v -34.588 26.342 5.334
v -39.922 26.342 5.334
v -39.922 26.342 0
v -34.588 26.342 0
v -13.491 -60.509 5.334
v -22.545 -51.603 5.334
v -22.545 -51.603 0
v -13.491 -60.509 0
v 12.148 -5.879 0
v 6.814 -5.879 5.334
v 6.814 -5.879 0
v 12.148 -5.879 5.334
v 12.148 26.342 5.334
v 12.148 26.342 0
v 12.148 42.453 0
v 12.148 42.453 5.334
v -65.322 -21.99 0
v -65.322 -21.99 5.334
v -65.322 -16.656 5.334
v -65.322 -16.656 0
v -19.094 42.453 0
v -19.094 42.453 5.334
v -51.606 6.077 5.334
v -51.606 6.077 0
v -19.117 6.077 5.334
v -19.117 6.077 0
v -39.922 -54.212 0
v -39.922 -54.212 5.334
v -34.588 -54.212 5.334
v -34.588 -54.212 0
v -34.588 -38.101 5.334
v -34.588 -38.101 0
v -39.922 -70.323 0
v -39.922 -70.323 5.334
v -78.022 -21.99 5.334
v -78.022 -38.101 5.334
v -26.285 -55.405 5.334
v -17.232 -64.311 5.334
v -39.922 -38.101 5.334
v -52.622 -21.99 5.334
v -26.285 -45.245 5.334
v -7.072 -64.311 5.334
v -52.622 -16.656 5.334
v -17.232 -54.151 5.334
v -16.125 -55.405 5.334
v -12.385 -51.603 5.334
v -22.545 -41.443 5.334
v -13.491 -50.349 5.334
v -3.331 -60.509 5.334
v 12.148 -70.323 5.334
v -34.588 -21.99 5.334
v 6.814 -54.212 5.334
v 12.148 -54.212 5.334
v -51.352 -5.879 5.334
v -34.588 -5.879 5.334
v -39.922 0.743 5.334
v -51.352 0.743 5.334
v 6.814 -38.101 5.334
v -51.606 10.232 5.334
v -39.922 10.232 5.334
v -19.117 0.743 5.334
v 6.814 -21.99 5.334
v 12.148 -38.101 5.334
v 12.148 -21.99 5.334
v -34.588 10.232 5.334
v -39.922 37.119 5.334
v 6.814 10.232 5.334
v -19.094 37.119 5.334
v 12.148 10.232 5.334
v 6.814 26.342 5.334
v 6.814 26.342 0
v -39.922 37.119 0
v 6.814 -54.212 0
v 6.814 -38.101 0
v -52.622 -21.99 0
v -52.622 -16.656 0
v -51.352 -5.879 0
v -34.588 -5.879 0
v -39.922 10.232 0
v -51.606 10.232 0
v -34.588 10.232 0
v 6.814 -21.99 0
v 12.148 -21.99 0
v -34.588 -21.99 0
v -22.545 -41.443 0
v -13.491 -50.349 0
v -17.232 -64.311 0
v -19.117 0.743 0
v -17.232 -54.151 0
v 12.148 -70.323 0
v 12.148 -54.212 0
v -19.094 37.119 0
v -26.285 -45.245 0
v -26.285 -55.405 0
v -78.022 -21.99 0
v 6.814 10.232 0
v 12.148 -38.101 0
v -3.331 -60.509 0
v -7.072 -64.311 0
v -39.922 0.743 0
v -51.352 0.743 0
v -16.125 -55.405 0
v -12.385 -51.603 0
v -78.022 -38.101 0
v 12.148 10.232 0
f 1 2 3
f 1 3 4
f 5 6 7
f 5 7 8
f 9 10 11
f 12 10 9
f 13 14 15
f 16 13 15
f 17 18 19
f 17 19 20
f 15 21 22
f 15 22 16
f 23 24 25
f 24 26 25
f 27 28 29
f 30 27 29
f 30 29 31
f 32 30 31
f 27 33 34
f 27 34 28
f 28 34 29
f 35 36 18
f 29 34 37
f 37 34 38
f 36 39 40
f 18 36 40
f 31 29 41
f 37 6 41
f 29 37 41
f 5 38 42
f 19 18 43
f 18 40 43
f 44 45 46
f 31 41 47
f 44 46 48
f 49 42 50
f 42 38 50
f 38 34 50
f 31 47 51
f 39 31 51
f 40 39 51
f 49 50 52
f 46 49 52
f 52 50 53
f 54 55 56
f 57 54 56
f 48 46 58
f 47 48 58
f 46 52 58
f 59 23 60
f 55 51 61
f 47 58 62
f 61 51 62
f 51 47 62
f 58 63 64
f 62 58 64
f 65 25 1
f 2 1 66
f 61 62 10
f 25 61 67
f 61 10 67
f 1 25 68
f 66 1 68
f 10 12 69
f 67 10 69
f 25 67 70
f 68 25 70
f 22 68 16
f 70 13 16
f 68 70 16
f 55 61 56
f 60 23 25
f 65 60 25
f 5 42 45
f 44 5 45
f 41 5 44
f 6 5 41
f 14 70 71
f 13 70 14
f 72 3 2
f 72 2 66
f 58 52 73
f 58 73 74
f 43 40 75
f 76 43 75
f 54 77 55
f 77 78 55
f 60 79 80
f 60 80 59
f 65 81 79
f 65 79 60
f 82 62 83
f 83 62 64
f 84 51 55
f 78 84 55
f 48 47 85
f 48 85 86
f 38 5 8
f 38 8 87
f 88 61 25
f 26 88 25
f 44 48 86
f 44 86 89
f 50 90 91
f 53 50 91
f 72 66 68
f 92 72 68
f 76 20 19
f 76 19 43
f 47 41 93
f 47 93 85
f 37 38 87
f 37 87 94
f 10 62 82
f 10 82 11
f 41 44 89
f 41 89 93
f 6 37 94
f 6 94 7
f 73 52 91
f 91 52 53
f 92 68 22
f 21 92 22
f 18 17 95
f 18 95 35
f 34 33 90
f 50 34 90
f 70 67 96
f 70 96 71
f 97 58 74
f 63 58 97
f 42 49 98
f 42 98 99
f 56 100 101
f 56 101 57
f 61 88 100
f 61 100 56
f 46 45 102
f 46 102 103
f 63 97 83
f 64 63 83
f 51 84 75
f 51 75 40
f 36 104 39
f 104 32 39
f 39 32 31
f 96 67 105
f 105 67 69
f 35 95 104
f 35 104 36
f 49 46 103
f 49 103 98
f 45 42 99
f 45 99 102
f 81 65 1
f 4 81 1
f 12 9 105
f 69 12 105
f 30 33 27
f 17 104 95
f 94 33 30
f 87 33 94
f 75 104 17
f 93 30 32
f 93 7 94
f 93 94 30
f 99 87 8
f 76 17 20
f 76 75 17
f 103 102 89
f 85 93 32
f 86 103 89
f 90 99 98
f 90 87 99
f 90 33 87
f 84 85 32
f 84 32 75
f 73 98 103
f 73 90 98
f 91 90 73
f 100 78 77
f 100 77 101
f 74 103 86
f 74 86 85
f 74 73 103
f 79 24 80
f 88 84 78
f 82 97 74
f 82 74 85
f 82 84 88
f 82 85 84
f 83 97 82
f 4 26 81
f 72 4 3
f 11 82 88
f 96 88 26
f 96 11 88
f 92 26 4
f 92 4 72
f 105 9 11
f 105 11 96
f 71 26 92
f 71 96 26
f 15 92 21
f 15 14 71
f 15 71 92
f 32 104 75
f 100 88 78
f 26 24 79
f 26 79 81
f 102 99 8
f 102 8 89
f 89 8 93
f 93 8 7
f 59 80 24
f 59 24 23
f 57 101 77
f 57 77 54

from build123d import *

# Parameters (mm, degrees)
SKETCH1_W           = 52.07
SKETCH1_H           = 112.776
BOSS_EXTRUDE1_DEPTH = 5.334
SKETCH2_W           = 5.334
SKETCH2_H           = 16.110857143
SKETCH2_H_2         = 16.110857142
CUT_EXTRUDE1_DEPTH  = 82.040197417
CUT_EXTRUDE2_DEPTH  = 82.040197417
SKETCH5_W           = 5.334
SKETCH5_H           = 16.110857143
BOSS_EXTRUDE2_DEPTH = 38.1
SKETCH6_W           = 12.7
SKETCH6_H           = 5.334
BOSS_EXTRUDE3_DEPTH = 5.334
SKETCH7_W           = 20.804949133
SKETCH7_H           = 5.334
CUT_EXTRUDE4_DEPTH  = 106.172156174
SKETCH8_W           = 5.334
SKETCH8_H           = 6.622142857
BOSS_EXTRUDE4_DEPTH = 11.43
SKETCH9_W           = 20.828
SKETCH9_H           = 5.334
CUT_EXTRUDE5_DEPTH  = 106.172156174
SKETCH10_W          = 5.334
SKETCH10_H          = 4.154714286
BOSS_EXTRUDE5_DEPTH = 11.684


with BuildPart() as part:
    # Sketch1 → Boss-Extrude1 (new body)
    with BuildSketch(Plane.XY):
        with Locations((-13.887031982, -13.934780119)):
            Rectangle(SKETCH1_W, SKETCH1_H)
    extrude(amount=BOSS_EXTRUDE1_DEPTH)

    # Sketch2 → Cut-Extrude1 (cut, through all)
    with BuildSketch(Plane.XY.offset(5.334)):
        with Locations((-37.255031982, 18.286934167)):
            Rectangle(SKETCH2_W, SKETCH2_H)
        with Locations((-37.255031982, -13.93478012)):
            Rectangle(SKETCH2_W, SKETCH2_H)
        with Locations((-37.255031982, -46.156494405)):
            Rectangle(SKETCH2_W, SKETCH2_H_2)
        with Locations((9.480968018, -46.156494405)):
            Rectangle(SKETCH2_W, SKETCH2_H_2)
        with Locations((9.480968018, -13.93478012)):
            Rectangle(SKETCH2_W, SKETCH2_H)
        with Locations((9.480968018, 18.286934167)):
            Rectangle(SKETCH2_W, SKETCH2_H)
    extrude(amount=-CUT_EXTRUDE1_DEPTH, mode=Mode.SUBTRACT)

    # Sketch3 → Cut-Extrude2 (cut, through all)
    with BuildSketch(Plane.XY.offset(5.334)):
        Polygon((-22.544809753, -41.442678073), (-13.491049115, -50.348823048), (-17.231630005, -54.151402516), (-26.285390642, -45.245257541), align=None)
        Polygon((-22.544809753, -51.602678073), (-13.491049115, -60.508823048), (-17.231630005, -64.311402516), (-26.285390642, -55.405257541), align=None)
        Polygon((-12.384809753, -51.602678073), (-3.331049115, -60.508823048), (-7.071630005, -64.311402516), (-16.125390642, -55.405257541), align=None)
    extrude(amount=-CUT_EXTRUDE2_DEPTH, mode=Mode.SUBTRACT)

    # Sketch5 → Boss-Extrude2 (add)
    with BuildSketch(Plane.ZY.offset(39.922031982)):
        with Locations((2.667, -30.045637263)):
            Rectangle(SKETCH5_W, SKETCH5_H)
    extrude(amount=BOSS_EXTRUDE2_DEPTH)

    # Sketch6 → Boss-Extrude3 (add)
    with BuildSketch(Plane(origin=(0, -21.990208691, 0), x_dir=(1, 0, 0), z_dir=(0, 1, 0))):
        with Locations((-58.972031982, -2.667)):
            Rectangle(SKETCH6_W, SKETCH6_H)
    extrude(amount=BOSS_EXTRUDE3_DEPTH)

    # Sketch7 → Cut-Extrude4 (cut, through all)
    with BuildSketch(Plane.XY.offset(5.334)):
        with Locations((-29.519557416, 3.409791309)):
            Rectangle(SKETCH7_W, SKETCH7_H)
    extrude(amount=-CUT_EXTRUDE4_DEPTH, mode=Mode.SUBTRACT)

    # Sketch8 → Boss-Extrude4 (add)
    with BuildSketch(Plane.ZY.offset(39.922031982)):
        with Locations((2.667, -2.56828012)):
            Rectangle(SKETCH8_W, SKETCH8_H)
    extrude(amount=BOSS_EXTRUDE4_DEPTH)

    # Sketch9 → Cut-Extrude5 (cut, through all)
    with BuildSketch(Plane.XY.offset(5.334)):
        with Locations((-29.508031982, 39.786219881)):
            Rectangle(SKETCH9_W, SKETCH9_H)
    extrude(amount=-CUT_EXTRUDE5_DEPTH, mode=Mode.SUBTRACT)

    # Sketch10 → Boss-Extrude5 (add)
    with BuildSketch(Plane.ZY.offset(39.922031982)):
        with Locations((2.667, 8.154148452)):
            Rectangle(SKETCH10_W, SKETCH10_H)
    extrude(amount=BOSS_EXTRUDE5_DEPTH)


solid = part.part
